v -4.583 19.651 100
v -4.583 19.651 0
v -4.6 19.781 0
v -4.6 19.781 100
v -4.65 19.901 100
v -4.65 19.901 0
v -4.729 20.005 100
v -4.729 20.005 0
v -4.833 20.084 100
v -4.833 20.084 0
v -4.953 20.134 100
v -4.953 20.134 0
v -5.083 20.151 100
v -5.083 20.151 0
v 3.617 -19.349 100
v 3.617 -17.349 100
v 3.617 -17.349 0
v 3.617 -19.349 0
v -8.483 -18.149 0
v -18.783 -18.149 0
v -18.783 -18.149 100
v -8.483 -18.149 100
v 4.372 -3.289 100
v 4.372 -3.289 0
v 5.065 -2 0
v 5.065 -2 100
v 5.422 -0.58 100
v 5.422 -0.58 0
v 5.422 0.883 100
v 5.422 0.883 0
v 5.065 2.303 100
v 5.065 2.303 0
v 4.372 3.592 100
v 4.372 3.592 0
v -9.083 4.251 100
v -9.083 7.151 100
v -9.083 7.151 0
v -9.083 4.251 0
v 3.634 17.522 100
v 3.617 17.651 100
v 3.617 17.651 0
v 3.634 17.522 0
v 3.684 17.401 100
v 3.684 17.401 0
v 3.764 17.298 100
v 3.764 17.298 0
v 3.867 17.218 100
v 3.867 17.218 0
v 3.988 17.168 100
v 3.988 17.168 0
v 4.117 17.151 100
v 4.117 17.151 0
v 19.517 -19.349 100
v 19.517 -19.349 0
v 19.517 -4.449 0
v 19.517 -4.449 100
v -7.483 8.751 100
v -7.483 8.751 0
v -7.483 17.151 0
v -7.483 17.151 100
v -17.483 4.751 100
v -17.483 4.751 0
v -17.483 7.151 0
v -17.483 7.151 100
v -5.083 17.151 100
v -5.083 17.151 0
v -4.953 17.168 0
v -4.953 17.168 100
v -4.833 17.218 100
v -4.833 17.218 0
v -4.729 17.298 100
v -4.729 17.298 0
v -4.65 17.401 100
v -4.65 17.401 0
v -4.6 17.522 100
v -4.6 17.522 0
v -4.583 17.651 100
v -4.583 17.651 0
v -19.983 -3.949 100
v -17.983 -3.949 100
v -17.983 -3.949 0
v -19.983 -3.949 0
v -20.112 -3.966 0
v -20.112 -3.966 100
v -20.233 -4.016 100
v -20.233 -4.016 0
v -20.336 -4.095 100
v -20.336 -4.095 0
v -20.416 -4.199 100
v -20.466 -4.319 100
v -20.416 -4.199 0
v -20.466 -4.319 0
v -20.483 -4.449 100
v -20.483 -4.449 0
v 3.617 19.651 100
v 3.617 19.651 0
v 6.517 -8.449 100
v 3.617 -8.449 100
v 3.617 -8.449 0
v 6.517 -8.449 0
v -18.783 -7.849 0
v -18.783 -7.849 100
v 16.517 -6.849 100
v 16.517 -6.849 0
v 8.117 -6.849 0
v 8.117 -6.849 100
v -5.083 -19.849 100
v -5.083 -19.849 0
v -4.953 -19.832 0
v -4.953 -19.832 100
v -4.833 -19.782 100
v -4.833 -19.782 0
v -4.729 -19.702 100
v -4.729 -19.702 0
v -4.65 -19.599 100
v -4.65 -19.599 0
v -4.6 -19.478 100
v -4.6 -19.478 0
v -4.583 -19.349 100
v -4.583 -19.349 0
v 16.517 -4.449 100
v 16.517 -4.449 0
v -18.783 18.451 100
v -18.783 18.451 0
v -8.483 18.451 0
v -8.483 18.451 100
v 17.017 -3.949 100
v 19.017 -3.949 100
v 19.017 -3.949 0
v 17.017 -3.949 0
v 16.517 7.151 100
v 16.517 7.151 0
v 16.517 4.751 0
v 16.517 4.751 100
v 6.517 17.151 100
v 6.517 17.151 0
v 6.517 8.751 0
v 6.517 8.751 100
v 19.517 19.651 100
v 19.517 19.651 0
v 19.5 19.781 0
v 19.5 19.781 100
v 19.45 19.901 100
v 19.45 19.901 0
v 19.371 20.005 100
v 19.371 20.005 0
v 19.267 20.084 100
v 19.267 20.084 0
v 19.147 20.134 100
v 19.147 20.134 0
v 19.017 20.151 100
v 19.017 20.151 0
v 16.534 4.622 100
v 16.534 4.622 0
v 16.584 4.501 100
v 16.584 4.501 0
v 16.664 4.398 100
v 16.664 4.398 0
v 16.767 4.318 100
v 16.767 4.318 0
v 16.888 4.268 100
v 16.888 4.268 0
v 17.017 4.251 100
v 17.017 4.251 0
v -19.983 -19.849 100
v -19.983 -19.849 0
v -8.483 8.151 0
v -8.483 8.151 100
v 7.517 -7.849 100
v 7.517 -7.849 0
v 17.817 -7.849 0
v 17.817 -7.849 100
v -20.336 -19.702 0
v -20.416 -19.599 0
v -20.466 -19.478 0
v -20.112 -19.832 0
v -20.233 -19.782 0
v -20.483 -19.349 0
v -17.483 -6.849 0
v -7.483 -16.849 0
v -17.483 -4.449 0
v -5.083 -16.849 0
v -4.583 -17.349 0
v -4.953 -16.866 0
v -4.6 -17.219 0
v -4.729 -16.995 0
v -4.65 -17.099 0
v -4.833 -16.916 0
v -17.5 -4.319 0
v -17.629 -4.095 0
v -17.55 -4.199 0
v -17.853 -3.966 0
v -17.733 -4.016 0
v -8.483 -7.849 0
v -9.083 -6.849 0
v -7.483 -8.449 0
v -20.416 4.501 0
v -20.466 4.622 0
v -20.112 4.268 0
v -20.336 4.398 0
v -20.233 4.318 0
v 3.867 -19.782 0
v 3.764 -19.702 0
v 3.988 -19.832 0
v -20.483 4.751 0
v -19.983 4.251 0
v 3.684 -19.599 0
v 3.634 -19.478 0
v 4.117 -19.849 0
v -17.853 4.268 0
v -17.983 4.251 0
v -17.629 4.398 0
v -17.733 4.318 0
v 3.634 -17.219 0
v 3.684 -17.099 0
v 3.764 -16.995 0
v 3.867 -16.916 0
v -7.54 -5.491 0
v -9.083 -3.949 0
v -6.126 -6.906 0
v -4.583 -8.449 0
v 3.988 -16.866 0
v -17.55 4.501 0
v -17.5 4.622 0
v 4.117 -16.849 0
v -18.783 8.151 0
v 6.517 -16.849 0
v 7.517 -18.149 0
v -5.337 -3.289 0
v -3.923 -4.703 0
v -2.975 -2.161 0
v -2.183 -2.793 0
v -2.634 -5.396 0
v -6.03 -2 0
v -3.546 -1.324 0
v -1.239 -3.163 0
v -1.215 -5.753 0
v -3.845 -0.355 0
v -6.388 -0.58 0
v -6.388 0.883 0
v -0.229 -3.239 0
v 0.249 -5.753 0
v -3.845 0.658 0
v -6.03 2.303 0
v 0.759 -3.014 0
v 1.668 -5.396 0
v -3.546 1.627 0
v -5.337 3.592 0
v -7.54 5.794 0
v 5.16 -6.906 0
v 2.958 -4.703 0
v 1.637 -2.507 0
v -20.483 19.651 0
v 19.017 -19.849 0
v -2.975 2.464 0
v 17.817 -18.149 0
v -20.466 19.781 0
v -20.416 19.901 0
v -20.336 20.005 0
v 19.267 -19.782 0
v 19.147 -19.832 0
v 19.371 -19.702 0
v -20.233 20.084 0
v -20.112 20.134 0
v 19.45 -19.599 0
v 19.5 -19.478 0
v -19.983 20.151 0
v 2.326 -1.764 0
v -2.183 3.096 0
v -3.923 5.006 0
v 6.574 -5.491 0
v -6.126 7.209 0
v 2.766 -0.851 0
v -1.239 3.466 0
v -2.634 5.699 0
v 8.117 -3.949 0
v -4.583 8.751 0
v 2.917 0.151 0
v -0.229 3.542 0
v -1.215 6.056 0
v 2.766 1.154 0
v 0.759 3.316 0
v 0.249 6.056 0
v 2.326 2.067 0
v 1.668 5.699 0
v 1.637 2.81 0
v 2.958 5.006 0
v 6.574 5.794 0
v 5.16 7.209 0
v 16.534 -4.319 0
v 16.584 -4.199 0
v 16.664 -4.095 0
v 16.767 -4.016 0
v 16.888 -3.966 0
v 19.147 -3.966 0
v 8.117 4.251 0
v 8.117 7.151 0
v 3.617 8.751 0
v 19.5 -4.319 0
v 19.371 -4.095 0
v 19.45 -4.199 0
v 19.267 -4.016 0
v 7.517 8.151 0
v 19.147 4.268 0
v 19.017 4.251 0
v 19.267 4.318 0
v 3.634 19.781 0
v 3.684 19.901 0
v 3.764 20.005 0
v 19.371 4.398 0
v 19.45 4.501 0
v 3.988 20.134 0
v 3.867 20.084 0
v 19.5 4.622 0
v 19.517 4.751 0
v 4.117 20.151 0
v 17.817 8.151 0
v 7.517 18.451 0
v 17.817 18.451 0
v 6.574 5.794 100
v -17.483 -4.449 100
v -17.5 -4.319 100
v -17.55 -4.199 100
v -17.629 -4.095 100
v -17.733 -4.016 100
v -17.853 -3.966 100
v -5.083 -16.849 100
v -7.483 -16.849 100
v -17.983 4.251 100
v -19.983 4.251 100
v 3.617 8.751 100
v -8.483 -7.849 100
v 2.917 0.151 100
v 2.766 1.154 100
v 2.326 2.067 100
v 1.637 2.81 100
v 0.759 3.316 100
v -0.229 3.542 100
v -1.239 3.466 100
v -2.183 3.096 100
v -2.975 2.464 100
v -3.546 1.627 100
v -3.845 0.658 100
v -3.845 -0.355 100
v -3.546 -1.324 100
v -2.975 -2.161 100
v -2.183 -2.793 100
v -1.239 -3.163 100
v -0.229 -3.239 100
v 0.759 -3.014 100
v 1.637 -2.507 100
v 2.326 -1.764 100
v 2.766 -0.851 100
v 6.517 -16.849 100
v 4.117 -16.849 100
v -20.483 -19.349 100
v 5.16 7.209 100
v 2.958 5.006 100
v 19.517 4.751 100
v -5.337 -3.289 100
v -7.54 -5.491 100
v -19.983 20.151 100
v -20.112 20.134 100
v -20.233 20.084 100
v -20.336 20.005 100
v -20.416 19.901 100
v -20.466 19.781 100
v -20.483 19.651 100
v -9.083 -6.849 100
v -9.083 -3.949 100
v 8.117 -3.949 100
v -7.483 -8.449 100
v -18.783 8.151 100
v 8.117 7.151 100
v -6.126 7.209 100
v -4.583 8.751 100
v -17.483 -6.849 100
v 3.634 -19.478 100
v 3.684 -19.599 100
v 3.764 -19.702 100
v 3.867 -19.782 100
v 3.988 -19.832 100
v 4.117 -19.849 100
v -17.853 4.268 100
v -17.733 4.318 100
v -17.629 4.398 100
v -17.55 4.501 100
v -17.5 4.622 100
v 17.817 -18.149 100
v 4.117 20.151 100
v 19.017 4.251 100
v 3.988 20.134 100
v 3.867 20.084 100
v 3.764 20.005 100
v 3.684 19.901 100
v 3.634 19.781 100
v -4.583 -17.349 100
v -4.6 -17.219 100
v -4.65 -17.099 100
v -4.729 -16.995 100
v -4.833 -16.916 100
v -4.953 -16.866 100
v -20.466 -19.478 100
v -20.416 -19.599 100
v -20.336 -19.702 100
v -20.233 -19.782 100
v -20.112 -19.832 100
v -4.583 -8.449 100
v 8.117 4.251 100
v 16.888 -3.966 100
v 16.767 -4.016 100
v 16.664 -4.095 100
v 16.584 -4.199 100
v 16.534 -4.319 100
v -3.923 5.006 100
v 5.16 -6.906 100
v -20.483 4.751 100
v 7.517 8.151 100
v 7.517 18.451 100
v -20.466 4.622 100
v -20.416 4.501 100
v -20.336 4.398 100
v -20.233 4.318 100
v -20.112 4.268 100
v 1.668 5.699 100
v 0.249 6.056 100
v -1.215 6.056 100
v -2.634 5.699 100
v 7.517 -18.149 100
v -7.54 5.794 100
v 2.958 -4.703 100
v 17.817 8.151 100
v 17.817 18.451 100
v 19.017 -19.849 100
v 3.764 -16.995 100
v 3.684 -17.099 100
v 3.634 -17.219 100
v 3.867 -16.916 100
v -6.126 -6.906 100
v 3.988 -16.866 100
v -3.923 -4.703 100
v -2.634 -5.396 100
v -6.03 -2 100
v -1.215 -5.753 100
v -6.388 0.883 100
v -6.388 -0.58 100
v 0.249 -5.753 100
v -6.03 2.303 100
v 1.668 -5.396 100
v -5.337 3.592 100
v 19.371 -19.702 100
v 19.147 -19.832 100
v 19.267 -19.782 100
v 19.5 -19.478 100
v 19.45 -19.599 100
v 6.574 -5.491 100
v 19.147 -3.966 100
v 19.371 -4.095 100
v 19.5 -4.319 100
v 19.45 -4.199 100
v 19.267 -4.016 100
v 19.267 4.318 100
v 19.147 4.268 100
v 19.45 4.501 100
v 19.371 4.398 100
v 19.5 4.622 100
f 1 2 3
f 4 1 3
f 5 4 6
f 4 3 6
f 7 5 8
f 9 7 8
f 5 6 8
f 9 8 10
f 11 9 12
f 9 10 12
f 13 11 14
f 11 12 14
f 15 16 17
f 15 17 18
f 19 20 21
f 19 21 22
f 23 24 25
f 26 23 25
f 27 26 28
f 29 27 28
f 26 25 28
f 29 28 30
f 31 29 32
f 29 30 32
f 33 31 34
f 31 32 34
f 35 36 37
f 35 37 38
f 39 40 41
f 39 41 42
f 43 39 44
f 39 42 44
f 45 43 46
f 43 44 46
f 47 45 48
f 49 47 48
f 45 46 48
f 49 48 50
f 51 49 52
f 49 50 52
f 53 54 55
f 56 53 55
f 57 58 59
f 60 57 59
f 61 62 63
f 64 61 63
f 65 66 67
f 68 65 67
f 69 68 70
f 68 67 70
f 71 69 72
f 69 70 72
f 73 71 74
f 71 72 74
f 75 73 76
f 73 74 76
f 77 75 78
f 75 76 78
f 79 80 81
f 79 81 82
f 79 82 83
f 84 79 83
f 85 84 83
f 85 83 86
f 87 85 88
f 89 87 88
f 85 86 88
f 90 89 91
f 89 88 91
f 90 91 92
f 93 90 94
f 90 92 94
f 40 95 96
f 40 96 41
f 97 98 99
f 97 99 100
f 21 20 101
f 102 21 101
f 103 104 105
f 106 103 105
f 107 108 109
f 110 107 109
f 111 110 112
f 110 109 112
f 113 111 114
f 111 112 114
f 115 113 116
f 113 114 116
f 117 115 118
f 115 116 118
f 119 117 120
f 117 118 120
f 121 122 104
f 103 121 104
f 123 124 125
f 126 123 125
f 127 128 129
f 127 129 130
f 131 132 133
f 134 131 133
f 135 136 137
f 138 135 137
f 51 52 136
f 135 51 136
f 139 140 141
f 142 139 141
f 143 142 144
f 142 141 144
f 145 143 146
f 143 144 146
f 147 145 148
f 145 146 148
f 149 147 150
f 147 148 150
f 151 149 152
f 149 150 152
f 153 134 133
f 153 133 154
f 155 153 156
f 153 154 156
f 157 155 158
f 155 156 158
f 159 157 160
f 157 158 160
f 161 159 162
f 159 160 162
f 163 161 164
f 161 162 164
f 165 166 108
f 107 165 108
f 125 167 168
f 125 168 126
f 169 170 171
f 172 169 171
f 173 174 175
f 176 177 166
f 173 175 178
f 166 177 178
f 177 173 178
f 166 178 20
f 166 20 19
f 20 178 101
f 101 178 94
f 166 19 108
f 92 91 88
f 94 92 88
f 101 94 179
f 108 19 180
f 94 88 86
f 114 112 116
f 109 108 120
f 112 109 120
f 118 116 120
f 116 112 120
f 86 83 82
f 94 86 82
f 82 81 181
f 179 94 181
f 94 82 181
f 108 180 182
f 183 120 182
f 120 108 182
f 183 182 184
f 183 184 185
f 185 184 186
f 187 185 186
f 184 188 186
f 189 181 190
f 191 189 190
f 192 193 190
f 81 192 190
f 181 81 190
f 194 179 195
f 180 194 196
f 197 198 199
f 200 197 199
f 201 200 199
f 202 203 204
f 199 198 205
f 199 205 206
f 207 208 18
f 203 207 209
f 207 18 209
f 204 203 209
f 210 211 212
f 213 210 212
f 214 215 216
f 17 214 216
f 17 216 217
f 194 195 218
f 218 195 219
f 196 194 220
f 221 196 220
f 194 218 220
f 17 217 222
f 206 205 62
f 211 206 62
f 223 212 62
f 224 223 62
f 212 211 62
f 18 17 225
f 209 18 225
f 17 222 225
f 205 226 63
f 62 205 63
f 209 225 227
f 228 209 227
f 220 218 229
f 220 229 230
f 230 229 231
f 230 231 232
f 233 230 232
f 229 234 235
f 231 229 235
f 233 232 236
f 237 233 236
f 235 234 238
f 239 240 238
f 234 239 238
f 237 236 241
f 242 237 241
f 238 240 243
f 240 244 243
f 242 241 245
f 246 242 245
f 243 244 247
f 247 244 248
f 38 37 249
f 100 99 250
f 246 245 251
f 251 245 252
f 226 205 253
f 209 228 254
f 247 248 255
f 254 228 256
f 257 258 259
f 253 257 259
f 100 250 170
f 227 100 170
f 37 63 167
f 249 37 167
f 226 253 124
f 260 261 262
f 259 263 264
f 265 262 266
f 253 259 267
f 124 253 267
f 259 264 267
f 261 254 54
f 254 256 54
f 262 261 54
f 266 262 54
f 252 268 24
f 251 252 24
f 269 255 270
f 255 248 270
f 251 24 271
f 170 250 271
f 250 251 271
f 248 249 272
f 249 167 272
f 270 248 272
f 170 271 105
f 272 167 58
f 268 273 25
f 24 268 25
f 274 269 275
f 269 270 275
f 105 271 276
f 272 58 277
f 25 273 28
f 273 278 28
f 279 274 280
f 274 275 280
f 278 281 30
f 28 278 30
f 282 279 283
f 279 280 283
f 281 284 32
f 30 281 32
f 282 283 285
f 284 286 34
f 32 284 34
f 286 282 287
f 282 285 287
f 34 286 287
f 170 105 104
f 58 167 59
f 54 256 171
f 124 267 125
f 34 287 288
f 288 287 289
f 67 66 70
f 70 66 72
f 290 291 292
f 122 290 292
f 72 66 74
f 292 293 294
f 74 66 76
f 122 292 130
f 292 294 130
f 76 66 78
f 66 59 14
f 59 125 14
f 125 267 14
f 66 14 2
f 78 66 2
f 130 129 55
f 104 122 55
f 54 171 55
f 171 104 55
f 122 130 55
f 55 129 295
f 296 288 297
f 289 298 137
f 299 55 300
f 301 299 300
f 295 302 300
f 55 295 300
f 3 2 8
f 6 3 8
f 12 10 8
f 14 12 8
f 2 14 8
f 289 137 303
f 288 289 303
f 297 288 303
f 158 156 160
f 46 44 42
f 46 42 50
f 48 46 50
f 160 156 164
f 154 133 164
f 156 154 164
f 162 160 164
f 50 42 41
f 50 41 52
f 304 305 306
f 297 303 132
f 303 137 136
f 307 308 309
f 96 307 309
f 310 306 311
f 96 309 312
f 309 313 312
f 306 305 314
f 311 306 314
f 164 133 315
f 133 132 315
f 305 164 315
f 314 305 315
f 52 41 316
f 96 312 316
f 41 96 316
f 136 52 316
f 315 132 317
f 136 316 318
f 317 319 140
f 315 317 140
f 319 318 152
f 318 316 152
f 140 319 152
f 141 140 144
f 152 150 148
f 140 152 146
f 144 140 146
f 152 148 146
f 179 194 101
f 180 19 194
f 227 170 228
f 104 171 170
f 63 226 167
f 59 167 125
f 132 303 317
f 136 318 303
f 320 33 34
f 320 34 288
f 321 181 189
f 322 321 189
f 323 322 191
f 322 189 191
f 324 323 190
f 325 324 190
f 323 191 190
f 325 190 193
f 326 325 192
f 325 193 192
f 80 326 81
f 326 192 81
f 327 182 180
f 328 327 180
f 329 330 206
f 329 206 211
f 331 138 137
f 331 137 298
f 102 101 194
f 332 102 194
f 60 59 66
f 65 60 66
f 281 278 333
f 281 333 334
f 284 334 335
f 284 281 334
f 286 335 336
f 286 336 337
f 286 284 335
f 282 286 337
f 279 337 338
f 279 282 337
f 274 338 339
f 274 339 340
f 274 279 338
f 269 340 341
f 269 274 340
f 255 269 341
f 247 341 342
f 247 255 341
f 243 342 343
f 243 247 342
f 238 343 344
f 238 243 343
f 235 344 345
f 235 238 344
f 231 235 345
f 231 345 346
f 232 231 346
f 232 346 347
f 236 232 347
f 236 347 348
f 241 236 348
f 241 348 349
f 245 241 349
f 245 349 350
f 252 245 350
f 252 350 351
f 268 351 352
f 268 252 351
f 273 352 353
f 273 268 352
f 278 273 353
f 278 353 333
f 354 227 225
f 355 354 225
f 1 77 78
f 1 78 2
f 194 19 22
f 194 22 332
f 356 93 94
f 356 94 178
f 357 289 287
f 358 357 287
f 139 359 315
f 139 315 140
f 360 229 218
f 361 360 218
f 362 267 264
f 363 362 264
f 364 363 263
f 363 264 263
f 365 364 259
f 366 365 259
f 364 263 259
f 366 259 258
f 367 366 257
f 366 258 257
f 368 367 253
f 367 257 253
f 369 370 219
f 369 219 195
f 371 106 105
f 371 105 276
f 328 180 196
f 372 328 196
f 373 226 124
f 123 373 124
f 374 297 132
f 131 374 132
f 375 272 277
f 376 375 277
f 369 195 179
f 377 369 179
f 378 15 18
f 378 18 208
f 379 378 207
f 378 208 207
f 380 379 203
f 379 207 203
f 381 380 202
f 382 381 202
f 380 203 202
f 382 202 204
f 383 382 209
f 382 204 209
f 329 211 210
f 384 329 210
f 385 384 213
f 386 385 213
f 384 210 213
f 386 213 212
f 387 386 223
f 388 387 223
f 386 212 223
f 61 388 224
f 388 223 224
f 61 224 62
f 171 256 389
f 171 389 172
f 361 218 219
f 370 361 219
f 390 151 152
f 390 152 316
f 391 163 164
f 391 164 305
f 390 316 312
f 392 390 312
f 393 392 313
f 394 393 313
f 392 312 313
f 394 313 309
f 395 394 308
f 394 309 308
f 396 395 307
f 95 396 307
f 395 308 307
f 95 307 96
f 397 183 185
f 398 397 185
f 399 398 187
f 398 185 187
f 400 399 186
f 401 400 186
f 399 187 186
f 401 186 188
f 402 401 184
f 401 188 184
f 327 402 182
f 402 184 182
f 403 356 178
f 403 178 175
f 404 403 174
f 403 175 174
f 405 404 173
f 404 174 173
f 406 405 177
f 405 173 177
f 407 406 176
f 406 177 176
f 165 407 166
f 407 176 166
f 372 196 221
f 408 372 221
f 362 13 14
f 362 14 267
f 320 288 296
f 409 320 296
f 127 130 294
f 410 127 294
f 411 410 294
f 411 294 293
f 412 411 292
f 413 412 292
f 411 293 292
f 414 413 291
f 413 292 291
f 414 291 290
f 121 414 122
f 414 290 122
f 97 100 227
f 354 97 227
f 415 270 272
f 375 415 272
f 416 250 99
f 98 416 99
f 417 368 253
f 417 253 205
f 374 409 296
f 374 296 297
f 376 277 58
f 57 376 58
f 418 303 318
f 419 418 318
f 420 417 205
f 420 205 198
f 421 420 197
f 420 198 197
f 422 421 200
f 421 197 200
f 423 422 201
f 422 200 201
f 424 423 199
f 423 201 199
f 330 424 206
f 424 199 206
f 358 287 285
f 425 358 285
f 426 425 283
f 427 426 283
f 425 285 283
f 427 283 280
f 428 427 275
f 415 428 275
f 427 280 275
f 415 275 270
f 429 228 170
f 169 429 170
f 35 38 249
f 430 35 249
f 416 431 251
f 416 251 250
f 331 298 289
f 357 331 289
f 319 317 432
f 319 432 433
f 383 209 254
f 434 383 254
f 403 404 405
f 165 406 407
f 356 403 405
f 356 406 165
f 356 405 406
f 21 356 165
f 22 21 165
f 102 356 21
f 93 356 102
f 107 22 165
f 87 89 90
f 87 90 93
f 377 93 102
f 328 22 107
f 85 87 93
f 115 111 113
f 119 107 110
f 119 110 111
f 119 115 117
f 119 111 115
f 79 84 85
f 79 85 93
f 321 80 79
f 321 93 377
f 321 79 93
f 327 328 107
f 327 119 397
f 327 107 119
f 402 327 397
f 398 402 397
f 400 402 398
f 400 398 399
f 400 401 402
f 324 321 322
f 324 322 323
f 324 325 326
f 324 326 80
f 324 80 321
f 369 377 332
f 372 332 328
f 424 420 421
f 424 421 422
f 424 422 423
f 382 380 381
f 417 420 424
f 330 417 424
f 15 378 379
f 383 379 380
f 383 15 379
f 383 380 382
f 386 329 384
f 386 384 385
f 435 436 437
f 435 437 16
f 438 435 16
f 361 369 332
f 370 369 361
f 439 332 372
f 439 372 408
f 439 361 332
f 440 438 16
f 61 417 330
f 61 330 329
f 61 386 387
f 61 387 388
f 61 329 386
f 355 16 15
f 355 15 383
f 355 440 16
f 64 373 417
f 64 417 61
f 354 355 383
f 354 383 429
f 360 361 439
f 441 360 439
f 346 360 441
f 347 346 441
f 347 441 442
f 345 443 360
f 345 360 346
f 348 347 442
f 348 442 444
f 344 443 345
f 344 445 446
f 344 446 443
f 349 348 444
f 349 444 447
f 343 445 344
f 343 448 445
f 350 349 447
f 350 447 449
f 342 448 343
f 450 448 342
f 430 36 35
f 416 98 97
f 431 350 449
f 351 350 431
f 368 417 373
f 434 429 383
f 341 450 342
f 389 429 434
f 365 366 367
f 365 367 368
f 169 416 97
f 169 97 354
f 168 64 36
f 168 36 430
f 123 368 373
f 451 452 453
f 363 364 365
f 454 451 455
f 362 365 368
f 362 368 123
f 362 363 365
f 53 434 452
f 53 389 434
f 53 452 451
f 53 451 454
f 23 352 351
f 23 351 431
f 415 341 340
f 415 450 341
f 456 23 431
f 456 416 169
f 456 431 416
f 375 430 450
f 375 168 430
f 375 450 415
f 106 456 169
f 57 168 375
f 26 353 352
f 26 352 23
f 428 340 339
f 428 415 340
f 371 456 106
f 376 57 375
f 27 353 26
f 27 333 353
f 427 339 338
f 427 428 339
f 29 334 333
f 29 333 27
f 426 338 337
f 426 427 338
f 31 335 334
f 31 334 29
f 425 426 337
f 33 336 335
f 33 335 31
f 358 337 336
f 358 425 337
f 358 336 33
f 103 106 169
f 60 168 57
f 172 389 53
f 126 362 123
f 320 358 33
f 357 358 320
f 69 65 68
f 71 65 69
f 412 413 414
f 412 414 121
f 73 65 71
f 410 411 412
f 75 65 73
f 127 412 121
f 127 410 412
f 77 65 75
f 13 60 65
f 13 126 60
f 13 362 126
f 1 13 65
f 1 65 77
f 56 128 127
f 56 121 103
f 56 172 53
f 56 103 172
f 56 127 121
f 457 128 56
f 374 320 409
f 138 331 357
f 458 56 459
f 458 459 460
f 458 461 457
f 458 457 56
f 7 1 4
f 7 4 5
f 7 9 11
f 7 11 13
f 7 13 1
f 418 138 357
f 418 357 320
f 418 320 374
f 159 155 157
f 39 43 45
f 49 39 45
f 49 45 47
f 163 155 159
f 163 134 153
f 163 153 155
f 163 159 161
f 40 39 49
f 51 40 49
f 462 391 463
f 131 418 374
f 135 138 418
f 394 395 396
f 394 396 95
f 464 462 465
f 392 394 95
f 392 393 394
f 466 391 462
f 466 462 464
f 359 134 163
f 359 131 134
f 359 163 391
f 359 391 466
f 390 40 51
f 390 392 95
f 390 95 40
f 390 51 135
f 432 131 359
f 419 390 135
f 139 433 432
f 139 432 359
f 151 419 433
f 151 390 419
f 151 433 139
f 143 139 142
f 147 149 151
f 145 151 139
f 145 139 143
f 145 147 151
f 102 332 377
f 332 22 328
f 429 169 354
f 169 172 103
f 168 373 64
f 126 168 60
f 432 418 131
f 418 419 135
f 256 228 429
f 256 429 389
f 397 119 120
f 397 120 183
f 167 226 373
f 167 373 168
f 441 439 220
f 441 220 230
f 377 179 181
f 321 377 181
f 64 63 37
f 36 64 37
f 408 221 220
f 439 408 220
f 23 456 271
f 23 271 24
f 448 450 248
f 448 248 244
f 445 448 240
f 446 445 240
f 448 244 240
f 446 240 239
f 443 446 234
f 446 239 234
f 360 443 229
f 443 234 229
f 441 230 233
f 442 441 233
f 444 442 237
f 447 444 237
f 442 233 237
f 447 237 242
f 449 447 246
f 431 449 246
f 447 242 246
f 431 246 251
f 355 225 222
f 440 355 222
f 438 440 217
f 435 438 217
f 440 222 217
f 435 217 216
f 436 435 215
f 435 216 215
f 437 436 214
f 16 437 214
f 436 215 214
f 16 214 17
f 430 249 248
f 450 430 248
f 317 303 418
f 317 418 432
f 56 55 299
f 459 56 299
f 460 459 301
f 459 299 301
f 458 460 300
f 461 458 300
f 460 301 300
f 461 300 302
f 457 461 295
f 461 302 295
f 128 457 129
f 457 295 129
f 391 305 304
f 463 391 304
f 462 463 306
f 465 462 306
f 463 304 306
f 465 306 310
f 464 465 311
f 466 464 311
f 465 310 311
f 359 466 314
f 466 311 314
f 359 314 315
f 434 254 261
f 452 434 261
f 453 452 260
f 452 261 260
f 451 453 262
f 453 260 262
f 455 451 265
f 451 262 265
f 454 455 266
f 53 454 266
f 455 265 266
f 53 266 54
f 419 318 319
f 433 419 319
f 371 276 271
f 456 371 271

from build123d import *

# Parameters (mm, degrees)
SKETCH_1_R      = 3.4
SKETCH_1_W      = 10.3
SKETCH_1_H      = 10.3
EXTRUDE_1_DEPTH = 100


with BuildPart() as part:
    # 草图1 → 凸台-拉伸1 (new body)
    with BuildSketch(Plane.XY):
        with BuildLine():
            Line((-4.582808051, 8.751402525), (-7.482808051, 8.751402525))
            Line((-7.482808051, 8.751402525), (-7.482808051, 17.151402525))
            Line((-7.482808051, 17.151402525), (-5.082808051, 17.151402525))
            ThreePointArc((-5.082808051, 17.151402525), (-4.72925466, 17.297849134), (-4.582808051, 17.651402525))
            Line((-4.582808051, 17.651402525), (-4.582808051, 19.651402525))
            ThreePointArc((-4.582808051, 19.651402525), (-4.72925466, 20.004955915), (-5.082808051, 20.151402525))
            Line((-5.082808051, 20.151402525), (-19.982808051, 20.151402525))
            ThreePointArc((-19.982808051, 20.151402525), (-20.336361441, 20.004955915), (-20.482808051, 19.651402525))
            Line((-20.482808051, 19.651402525), (-20.482808051, 4.751402525))
            ThreePointArc((-20.482808051, 4.751402525), (-20.336361441, 4.397849134), (-19.982808051, 4.251402525))
            Line((-19.982808051, 4.251402525), (-17.982808051, 4.251402525))
            ThreePointArc((-17.982808051, 4.251402525), (-17.62925466, 4.397849134), (-17.482808051, 4.751402525))
            Line((-17.482808051, 4.751402525), (-17.482808051, 7.151402525))
            Line((-17.482808051, 7.151402525), (-9.082808051, 7.151402525))
            Line((-9.082808051, 7.151402525), (-9.082808051, 4.251402525))
            Line((-9.082808051, 4.251402525), (-7.539914832, 5.794295743))
            Line((-7.539914832, 5.794295743), (-5.337353801, 3.591734712))
            ThreePointArc((-5.337353801, 3.591734712), (-6.432808051, 0.151402525), (-5.337353801, -3.288929663))
            Line((-5.337353801, -3.288929663), (-7.539914832, -5.491490694))
            Line((-7.539914832, -5.491490694), (-9.082808051, -3.948597475))
            Line((-9.082808051, -3.948597475), (-9.082808051, -6.848597475))
            Line((-9.082808051, -6.848597475), (-17.482808051, -6.848597475))
            Line((-17.482808051, -6.848597475), (-17.482808051, -4.448597475))
            ThreePointArc((-17.482808051, -4.448597475), (-17.62925466, -4.095044085), (-17.982808051, -3.948597475))
            Line((-17.982808051, -3.948597475), (-19.982808051, -3.948597475))
            ThreePointArc((-19.982808051, -3.948597475), (-20.336361441, -4.095044085), (-20.482808051, -4.448597475))
            Line((-20.482808051, -4.448597475), (-20.482808051, -19.348597475))
            ThreePointArc((-20.482808051, -19.348597475), (-20.336361441, -19.702150866), (-19.982808051, -19.848597475))
            Line((-19.982808051, -19.848597475), (-5.082808051, -19.848597475))
            ThreePointArc((-5.082808051, -19.848597475), (-4.72925466, -19.702150866), (-4.582808051, -19.348597475))
            Line((-4.582808051, -19.348597475), (-4.582808051, -17.348597475))
            ThreePointArc((-4.582808051, -17.348597475), (-4.72925466, -16.995044085), (-5.082808051, -16.848597475))
            Line((-5.082808051, -16.848597475), (-7.482808051, -16.848597475))
            Line((-7.482808051, -16.848597475), (-7.482808051, -8.448597475))
            Line((-7.482808051, -8.448597475), (-4.582808051, -8.448597475))
            Line((-4.582808051, -8.448597475), (-6.125701269, -6.905704257))
            Line((-6.125701269, -6.905704257), (-3.923140238, -4.703143225))
            ThreePointArc((-3.923140238, -4.703143225), (-0.482808051, -5.798597475), (2.957524137, -4.703143225))
            Line((2.957524137, -4.703143225), (5.160085168, -6.905704257))
            Line((5.160085168, -6.905704257), (3.617191949, -8.448597475))
            Line((3.617191949, -8.448597475), (6.517191949, -8.448597475))
            Line((6.517191949, -8.448597475), (6.517191949, -16.848597475))
            Line((6.517191949, -16.848597475), (4.117191949, -16.848597475))
            ThreePointArc((4.117191949, -16.848597475), (3.763638559, -16.995044085), (3.617191949, -17.348597475))
            Line((3.617191949, -17.348597475), (3.617191949, -19.348597475))
            ThreePointArc((3.617191949, -19.348597475), (3.763638559, -19.702150866), (4.117191949, -19.848597475))
            Line((4.117191949, -19.848597475), (19.017191949, -19.848597475))
            ThreePointArc((19.017191949, -19.848597475), (19.37074534, -19.702150866), (19.517191949, -19.348597475))
            Line((19.517191949, -19.348597475), (19.517191949, -4.448597475))
            ThreePointArc((19.517191949, -4.448597475), (19.37074534, -4.095044085), (19.017191949, -3.948597475))
            Line((19.017191949, -3.948597475), (17.017191949, -3.948597475))
            ThreePointArc((17.017191949, -3.948597475), (16.663638559, -4.095044085), (16.517191949, -4.448597475))
            Line((16.517191949, -4.448597475), (16.517191949, -6.848597475))
            Line((16.517191949, -6.848597475), (8.117191949, -6.848597475))
            Line((8.117191949, -6.848597475), (8.117191949, -3.948597475))
            Line((8.117191949, -3.948597475), (6.574298731, -5.491490694))
            Line((6.574298731, -5.491490694), (4.371737699, -3.288929663))
            ThreePointArc((4.371737699, -3.288929663), (5.467191949, 0.151402525), (4.371737699, 3.591734712))
            Line((4.371737699, 3.591734712), (6.574298731, 5.794295743))
            Line((6.574298731, 5.794295743), (8.117191949, 4.251402525))
            Line((8.117191949, 4.251402525), (8.117191949, 7.151402525))
            Line((8.117191949, 7.151402525), (16.517191949, 7.151402525))
            Line((16.517191949, 7.151402525), (16.517191949, 4.751402525))
            ThreePointArc((16.517191949, 4.751402525), (16.663638559, 4.397849134), (17.017191949, 4.251402525))
            Line((17.017191949, 4.251402525), (19.017191949, 4.251402525))
            ThreePointArc((19.017191949, 4.251402525), (19.37074534, 4.397849134), (19.517191949, 4.751402525))
            Line((19.517191949, 4.751402525), (19.517191949, 19.651402525))
            ThreePointArc((19.517191949, 19.651402525), (19.37074534, 20.004955915), (19.017191949, 20.151402525))
            Line((19.017191949, 20.151402525), (4.117191949, 20.151402525))
            ThreePointArc((4.117191949, 20.151402525), (3.763638559, 20.004955915), (3.617191949, 19.651402525))
            Line((3.617191949, 19.651402525), (3.617191949, 17.651402525))
            ThreePointArc((3.617191949, 17.651402525), (3.763638559, 17.297849134), (4.117191949, 17.151402525))
            Line((4.117191949, 17.151402525), (6.517191949, 17.151402525))
            Line((6.517191949, 17.151402525), (6.517191949, 8.751402525))
            Line((6.517191949, 8.751402525), (3.617191949, 8.751402525))
            Line((3.617191949, 8.751402525), (5.160085168, 7.208509306))
            Line((5.160085168, 7.208509306), (2.957524137, 5.005948275))
            ThreePointArc((2.957524137, 5.005948275), (-0.482808051, 6.101402525), (-3.923140238, 5.005948275))
            Line((-3.923140238, 5.005948275), (-6.125701269, 7.208509306))
            Line((-6.125701269, 7.208509306), (-4.582808051, 8.751402525))
        make_face()
        with Locations((-0.482808051, 0.151402525)):
            Circle(SKETCH_1_R, mode=Mode.SUBTRACT)
        with Locations((-13.632808051, 13.301402525)):
            Rectangle(SKETCH_1_W, SKETCH_1_H, mode=Mode.SUBTRACT)
        with Locations((12.667191949, 13.301402525)):
            Rectangle(SKETCH_1_W, SKETCH_1_H, mode=Mode.SUBTRACT)
        with Locations((-13.632808051, -12.998597475)):
            Rectangle(SKETCH_1_W, SKETCH_1_H, mode=Mode.SUBTRACT)
        with Locations((12.667191949, -12.998597475)):
            Rectangle(SKETCH_1_W, SKETCH_1_H, mode=Mode.SUBTRACT)
    extrude(amount=EXTRUDE_1_DEPTH)


solid = part.part
